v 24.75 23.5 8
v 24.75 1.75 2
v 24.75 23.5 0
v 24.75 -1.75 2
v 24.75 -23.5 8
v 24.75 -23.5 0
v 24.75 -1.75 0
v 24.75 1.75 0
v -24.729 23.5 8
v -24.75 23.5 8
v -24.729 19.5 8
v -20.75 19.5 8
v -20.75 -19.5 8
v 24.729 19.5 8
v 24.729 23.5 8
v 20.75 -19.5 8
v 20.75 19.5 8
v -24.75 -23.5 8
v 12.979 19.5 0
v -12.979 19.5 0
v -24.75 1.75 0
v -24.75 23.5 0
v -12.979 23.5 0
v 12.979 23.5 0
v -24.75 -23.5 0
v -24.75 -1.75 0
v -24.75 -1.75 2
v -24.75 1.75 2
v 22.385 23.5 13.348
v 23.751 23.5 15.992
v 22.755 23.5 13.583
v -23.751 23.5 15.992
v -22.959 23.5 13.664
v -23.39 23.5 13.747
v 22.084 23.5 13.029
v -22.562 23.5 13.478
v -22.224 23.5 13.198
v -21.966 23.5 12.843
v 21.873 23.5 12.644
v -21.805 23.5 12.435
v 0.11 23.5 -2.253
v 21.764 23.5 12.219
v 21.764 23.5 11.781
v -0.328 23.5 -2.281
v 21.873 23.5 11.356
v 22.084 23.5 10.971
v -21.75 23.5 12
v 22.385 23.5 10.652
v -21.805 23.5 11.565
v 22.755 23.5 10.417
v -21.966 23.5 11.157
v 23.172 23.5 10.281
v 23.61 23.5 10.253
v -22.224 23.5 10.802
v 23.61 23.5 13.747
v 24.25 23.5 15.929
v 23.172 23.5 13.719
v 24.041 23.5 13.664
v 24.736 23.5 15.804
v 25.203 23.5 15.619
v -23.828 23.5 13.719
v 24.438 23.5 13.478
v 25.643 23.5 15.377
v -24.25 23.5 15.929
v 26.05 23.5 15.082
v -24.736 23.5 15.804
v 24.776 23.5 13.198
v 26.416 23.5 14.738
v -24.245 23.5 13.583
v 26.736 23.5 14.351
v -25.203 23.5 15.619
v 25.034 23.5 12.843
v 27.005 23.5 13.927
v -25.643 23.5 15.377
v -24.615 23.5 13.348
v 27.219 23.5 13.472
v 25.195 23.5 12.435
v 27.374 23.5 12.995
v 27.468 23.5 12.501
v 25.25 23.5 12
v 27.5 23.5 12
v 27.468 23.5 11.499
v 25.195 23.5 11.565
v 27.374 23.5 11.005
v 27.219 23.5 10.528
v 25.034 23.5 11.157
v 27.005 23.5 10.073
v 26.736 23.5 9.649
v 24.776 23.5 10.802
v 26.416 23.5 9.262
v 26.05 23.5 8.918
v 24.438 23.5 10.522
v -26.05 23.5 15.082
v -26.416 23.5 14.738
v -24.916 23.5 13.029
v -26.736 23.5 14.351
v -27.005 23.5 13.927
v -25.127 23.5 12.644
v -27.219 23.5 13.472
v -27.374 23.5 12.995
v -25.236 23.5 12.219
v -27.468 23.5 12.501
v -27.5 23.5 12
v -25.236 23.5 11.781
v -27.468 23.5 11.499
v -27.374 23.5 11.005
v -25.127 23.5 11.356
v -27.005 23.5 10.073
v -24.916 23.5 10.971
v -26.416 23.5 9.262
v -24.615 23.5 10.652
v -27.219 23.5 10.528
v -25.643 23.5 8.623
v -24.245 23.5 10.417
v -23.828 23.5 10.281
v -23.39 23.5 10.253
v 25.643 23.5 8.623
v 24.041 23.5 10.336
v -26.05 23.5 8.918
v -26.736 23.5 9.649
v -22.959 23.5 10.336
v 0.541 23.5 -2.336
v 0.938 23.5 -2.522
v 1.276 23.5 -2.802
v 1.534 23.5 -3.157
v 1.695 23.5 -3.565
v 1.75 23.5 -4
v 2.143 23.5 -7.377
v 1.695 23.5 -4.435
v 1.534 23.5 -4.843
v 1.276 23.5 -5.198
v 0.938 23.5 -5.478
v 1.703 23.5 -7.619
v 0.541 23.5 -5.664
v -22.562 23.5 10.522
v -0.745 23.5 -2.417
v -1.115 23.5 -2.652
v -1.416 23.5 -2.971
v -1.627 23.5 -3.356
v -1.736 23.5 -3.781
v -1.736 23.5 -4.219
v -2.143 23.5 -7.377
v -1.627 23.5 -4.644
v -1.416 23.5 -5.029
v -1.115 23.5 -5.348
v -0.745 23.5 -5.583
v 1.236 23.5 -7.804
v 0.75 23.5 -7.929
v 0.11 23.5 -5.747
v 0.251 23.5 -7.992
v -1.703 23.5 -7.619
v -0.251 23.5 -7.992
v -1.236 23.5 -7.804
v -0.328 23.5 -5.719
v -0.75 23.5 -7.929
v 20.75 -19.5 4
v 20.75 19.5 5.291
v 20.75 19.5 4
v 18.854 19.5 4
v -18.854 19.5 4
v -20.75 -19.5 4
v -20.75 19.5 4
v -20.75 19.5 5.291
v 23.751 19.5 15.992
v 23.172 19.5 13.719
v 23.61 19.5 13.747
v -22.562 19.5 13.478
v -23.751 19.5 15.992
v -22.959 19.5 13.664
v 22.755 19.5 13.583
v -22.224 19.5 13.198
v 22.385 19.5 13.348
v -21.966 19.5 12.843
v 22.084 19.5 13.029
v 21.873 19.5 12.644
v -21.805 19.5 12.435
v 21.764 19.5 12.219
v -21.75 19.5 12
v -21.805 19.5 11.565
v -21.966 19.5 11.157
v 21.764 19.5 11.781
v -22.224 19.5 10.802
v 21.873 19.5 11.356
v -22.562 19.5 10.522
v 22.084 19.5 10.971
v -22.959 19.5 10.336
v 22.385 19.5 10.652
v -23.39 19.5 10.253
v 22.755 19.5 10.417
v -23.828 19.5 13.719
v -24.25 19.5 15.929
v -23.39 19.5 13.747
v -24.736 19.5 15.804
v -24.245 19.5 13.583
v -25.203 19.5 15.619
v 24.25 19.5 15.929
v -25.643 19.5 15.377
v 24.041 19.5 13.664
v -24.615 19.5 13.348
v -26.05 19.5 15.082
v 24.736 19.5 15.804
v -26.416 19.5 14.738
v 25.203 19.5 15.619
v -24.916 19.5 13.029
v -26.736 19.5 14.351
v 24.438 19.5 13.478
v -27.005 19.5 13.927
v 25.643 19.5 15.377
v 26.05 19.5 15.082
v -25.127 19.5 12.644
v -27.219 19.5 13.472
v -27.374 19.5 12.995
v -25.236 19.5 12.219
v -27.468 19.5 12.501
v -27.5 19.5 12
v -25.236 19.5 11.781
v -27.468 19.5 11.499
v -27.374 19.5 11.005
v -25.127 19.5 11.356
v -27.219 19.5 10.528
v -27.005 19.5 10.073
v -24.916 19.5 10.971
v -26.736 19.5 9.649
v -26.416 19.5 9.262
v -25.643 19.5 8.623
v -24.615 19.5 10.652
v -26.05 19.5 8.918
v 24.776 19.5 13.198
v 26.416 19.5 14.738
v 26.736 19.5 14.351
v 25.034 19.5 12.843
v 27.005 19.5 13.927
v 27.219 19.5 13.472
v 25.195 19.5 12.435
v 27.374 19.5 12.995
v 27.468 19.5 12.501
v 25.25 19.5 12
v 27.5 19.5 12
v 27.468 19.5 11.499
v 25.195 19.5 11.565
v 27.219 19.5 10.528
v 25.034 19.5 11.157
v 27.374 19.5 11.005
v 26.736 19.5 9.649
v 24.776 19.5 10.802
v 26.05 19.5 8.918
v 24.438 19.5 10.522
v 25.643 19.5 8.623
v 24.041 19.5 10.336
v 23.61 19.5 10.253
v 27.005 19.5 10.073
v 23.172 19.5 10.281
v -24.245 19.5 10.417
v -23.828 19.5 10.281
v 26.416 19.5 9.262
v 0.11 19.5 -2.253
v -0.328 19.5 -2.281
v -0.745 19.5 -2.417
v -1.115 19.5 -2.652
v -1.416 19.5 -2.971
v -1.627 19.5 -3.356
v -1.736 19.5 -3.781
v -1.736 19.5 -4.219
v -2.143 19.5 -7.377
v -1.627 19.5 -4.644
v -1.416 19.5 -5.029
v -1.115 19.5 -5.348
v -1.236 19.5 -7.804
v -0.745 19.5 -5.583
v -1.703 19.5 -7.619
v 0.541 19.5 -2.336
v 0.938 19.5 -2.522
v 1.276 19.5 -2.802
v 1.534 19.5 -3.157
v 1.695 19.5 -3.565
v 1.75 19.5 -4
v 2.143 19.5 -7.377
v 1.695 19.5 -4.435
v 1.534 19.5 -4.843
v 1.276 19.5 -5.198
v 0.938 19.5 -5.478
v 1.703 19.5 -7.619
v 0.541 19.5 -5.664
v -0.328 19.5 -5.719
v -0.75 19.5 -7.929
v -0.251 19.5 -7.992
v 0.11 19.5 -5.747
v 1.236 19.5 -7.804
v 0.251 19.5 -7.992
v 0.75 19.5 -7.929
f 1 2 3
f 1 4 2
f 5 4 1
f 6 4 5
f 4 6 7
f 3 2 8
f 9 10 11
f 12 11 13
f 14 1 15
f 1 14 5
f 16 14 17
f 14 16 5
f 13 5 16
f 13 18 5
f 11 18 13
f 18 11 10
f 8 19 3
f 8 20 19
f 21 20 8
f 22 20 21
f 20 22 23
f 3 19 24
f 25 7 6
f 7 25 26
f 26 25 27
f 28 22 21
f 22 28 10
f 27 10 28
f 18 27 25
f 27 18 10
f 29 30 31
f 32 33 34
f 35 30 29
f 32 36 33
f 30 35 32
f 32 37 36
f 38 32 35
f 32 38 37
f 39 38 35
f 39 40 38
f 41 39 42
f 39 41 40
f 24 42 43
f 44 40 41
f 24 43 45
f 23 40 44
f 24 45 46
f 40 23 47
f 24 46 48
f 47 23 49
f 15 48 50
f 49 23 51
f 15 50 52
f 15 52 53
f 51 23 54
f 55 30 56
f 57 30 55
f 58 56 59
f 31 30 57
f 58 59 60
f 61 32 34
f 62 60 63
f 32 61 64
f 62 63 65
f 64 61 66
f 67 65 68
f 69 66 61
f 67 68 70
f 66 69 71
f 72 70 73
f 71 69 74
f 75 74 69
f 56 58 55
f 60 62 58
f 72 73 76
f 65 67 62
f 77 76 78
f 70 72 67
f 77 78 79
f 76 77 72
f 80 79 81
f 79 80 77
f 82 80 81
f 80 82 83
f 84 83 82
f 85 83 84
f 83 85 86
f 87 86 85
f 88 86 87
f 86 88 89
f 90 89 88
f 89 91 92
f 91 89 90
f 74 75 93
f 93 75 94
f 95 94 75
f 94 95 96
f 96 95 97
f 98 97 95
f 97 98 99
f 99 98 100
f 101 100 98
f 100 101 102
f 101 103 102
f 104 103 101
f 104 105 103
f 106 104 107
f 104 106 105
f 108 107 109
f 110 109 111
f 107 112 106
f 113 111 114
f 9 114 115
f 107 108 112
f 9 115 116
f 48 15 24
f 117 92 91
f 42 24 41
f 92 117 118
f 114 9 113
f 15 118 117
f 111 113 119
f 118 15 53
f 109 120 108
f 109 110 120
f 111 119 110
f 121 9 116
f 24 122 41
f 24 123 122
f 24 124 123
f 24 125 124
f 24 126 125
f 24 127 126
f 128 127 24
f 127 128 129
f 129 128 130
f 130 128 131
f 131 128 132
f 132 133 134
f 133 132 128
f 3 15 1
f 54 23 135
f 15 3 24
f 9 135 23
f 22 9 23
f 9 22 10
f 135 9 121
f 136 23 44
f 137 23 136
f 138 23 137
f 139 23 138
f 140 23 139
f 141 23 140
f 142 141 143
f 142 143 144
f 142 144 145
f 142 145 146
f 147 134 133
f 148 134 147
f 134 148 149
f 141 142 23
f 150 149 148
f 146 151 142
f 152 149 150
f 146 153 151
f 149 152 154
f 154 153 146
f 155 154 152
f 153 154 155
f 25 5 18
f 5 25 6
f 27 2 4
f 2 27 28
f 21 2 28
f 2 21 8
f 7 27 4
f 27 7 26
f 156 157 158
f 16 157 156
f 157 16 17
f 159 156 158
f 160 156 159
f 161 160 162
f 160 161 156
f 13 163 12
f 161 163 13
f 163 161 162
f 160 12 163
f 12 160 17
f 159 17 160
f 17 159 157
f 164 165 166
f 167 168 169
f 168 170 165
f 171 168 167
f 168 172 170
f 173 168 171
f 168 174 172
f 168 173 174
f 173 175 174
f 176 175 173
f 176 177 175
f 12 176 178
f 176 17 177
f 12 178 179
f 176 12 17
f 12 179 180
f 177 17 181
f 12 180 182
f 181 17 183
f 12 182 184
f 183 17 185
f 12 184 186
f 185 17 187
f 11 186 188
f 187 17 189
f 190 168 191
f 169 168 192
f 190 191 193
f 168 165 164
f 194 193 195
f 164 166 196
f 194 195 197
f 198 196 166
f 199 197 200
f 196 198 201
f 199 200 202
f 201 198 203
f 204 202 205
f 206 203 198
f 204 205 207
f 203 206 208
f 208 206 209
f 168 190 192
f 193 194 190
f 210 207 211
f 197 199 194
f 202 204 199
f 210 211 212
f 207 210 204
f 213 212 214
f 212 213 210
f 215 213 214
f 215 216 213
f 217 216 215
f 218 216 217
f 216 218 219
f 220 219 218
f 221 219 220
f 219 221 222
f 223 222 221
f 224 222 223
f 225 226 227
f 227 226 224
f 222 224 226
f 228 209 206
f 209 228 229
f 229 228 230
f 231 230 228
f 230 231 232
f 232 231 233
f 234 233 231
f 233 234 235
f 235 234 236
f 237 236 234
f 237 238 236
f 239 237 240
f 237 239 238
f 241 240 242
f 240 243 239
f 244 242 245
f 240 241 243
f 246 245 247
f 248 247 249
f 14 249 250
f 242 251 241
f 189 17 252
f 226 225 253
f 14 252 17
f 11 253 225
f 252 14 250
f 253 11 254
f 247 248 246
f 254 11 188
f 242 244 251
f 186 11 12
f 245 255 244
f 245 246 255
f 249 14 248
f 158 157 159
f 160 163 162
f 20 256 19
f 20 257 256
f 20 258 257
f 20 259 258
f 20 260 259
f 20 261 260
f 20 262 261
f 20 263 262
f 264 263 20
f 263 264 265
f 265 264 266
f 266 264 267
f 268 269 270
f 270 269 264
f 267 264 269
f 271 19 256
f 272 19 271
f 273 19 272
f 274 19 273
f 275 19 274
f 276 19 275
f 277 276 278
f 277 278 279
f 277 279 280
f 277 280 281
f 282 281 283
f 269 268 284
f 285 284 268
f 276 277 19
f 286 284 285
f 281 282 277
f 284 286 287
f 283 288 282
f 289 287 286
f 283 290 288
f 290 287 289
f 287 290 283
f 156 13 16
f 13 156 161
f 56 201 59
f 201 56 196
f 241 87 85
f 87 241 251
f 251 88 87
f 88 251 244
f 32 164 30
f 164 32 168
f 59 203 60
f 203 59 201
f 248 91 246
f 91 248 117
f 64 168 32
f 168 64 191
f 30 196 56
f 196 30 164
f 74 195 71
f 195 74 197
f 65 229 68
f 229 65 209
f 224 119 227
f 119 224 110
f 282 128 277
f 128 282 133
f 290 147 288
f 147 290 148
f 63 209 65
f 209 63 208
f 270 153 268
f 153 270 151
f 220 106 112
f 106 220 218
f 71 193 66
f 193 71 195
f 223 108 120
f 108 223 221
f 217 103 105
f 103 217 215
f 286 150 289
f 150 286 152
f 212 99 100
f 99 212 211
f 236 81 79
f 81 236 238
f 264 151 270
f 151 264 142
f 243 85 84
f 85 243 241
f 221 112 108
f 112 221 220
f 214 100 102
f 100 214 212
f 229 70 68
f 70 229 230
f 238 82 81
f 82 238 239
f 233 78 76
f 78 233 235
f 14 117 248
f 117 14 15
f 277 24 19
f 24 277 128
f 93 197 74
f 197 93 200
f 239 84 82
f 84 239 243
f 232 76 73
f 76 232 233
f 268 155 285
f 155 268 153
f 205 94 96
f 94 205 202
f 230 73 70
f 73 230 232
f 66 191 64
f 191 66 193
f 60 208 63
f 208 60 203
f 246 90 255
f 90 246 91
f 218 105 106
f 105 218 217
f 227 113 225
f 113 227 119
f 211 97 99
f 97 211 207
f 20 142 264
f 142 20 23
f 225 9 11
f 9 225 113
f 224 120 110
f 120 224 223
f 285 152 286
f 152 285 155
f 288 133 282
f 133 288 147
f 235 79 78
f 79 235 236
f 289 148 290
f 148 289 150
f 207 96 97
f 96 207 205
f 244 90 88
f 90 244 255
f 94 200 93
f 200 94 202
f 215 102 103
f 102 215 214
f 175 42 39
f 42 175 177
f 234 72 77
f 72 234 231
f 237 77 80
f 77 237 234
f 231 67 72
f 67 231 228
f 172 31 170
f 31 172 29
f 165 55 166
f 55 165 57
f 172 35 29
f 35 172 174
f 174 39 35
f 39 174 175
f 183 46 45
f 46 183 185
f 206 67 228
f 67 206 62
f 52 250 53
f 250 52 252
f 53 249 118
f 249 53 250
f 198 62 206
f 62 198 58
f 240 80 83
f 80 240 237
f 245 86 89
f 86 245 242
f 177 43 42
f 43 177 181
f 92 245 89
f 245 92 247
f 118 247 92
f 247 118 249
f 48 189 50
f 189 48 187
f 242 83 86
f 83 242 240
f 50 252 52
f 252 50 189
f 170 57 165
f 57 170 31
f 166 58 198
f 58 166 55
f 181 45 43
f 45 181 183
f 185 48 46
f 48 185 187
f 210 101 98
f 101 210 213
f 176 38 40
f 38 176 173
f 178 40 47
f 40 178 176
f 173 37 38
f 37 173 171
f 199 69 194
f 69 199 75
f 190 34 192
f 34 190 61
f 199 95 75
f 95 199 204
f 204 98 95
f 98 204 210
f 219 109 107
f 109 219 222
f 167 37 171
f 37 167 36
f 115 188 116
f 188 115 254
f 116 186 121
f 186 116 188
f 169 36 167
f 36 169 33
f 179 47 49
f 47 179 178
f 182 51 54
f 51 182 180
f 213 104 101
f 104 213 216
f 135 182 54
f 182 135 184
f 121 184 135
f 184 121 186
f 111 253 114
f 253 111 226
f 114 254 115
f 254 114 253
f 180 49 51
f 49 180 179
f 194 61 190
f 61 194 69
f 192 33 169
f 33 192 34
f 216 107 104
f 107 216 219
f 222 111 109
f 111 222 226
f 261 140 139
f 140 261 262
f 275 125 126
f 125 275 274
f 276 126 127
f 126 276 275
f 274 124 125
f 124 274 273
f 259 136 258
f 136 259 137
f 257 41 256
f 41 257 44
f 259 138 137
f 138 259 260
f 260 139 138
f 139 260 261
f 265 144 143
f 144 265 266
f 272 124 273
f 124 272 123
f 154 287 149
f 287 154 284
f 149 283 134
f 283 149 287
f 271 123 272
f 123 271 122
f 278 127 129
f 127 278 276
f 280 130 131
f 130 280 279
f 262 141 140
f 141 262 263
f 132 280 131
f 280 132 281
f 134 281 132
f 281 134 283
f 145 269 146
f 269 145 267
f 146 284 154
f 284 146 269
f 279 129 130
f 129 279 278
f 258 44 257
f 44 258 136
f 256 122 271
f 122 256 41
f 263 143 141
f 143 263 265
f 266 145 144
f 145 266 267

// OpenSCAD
baseThickness = 4.0;
bezelWidth = 4.0;
bezelHeight = 4.0;

boardWidth = 41.5;
boardLength = 39.0;

cableTieWidth = 3.5;
cableTieHeight = 2.0;
cableTieCentreOffset = 0.0;

screwRadius = 3.5 / 2;
screwTabRadius = 8 / 2;

screwSeparation = 47.0;

// Board cradle
difference() {
  // Main body
  translate([-(boardWidth / 2 + bezelWidth), -(boardLength / 2 + bezelWidth), 0]) {
    cube([boardWidth + bezelWidth * 2, boardLength + bezelWidth * 2, baseThickness + bezelHeight]);
  }
  
  // Cable tie hole
  translate([-(boardWidth / 2 + bezelWidth), cableTieCentreOffset - cableTieWidth / 2, 0]) {
    cube([boardWidth + bezelWidth * 2, cableTieWidth, cableTieHeight]);
  }
  
  // Board cutout
  translate([-boardWidth / 2, -boardLength / 2, baseThickness]) {
    cube([boardWidth, boardLength, bezelHeight]);
  }
}

// Right ange support
translate([0, boardLength / 2 + bezelWidth, screwTabRadius + baseThickness + bezelHeight])
rotate([90, 0, 0])
difference() {
  union() {
    // Discorectangle for tab bodies
    hull() {
      translate([screwSeparation / 2, 0, 0]) {
        cylinder(baseThickness, screwTabRadius, screwTabRadius, $fn = 50);
      }
      translate([-screwSeparation / 2, 0, 0]) {
        cylinder(baseThickness, screwTabRadius, screwTabRadius, $fn = 50);
      }
      translate([0, -(bezelWidth + 3 * screwTabRadius), 0]) {
        cylinder(baseThickness, screwTabRadius, screwTabRadius, $fn = 50);
      }
    }
  }
  
  // Screw holes for tapping
  translate([screwSeparation / 2, 0, 0]) {
    cylinder(baseThickness, screwRadius, screwRadius, $fn = 25);
  }
  translate([-screwSeparation / 2, 0, 0]) {
    cylinder(baseThickness, screwRadius, screwRadius, $fn = 25);
  }
  translate([0, -(bezelWidth + 3 * screwTabRadius), 0]) {
    cylinder(baseThickness, screwRadius, screwRadius, $fn = 25);
  }
}
